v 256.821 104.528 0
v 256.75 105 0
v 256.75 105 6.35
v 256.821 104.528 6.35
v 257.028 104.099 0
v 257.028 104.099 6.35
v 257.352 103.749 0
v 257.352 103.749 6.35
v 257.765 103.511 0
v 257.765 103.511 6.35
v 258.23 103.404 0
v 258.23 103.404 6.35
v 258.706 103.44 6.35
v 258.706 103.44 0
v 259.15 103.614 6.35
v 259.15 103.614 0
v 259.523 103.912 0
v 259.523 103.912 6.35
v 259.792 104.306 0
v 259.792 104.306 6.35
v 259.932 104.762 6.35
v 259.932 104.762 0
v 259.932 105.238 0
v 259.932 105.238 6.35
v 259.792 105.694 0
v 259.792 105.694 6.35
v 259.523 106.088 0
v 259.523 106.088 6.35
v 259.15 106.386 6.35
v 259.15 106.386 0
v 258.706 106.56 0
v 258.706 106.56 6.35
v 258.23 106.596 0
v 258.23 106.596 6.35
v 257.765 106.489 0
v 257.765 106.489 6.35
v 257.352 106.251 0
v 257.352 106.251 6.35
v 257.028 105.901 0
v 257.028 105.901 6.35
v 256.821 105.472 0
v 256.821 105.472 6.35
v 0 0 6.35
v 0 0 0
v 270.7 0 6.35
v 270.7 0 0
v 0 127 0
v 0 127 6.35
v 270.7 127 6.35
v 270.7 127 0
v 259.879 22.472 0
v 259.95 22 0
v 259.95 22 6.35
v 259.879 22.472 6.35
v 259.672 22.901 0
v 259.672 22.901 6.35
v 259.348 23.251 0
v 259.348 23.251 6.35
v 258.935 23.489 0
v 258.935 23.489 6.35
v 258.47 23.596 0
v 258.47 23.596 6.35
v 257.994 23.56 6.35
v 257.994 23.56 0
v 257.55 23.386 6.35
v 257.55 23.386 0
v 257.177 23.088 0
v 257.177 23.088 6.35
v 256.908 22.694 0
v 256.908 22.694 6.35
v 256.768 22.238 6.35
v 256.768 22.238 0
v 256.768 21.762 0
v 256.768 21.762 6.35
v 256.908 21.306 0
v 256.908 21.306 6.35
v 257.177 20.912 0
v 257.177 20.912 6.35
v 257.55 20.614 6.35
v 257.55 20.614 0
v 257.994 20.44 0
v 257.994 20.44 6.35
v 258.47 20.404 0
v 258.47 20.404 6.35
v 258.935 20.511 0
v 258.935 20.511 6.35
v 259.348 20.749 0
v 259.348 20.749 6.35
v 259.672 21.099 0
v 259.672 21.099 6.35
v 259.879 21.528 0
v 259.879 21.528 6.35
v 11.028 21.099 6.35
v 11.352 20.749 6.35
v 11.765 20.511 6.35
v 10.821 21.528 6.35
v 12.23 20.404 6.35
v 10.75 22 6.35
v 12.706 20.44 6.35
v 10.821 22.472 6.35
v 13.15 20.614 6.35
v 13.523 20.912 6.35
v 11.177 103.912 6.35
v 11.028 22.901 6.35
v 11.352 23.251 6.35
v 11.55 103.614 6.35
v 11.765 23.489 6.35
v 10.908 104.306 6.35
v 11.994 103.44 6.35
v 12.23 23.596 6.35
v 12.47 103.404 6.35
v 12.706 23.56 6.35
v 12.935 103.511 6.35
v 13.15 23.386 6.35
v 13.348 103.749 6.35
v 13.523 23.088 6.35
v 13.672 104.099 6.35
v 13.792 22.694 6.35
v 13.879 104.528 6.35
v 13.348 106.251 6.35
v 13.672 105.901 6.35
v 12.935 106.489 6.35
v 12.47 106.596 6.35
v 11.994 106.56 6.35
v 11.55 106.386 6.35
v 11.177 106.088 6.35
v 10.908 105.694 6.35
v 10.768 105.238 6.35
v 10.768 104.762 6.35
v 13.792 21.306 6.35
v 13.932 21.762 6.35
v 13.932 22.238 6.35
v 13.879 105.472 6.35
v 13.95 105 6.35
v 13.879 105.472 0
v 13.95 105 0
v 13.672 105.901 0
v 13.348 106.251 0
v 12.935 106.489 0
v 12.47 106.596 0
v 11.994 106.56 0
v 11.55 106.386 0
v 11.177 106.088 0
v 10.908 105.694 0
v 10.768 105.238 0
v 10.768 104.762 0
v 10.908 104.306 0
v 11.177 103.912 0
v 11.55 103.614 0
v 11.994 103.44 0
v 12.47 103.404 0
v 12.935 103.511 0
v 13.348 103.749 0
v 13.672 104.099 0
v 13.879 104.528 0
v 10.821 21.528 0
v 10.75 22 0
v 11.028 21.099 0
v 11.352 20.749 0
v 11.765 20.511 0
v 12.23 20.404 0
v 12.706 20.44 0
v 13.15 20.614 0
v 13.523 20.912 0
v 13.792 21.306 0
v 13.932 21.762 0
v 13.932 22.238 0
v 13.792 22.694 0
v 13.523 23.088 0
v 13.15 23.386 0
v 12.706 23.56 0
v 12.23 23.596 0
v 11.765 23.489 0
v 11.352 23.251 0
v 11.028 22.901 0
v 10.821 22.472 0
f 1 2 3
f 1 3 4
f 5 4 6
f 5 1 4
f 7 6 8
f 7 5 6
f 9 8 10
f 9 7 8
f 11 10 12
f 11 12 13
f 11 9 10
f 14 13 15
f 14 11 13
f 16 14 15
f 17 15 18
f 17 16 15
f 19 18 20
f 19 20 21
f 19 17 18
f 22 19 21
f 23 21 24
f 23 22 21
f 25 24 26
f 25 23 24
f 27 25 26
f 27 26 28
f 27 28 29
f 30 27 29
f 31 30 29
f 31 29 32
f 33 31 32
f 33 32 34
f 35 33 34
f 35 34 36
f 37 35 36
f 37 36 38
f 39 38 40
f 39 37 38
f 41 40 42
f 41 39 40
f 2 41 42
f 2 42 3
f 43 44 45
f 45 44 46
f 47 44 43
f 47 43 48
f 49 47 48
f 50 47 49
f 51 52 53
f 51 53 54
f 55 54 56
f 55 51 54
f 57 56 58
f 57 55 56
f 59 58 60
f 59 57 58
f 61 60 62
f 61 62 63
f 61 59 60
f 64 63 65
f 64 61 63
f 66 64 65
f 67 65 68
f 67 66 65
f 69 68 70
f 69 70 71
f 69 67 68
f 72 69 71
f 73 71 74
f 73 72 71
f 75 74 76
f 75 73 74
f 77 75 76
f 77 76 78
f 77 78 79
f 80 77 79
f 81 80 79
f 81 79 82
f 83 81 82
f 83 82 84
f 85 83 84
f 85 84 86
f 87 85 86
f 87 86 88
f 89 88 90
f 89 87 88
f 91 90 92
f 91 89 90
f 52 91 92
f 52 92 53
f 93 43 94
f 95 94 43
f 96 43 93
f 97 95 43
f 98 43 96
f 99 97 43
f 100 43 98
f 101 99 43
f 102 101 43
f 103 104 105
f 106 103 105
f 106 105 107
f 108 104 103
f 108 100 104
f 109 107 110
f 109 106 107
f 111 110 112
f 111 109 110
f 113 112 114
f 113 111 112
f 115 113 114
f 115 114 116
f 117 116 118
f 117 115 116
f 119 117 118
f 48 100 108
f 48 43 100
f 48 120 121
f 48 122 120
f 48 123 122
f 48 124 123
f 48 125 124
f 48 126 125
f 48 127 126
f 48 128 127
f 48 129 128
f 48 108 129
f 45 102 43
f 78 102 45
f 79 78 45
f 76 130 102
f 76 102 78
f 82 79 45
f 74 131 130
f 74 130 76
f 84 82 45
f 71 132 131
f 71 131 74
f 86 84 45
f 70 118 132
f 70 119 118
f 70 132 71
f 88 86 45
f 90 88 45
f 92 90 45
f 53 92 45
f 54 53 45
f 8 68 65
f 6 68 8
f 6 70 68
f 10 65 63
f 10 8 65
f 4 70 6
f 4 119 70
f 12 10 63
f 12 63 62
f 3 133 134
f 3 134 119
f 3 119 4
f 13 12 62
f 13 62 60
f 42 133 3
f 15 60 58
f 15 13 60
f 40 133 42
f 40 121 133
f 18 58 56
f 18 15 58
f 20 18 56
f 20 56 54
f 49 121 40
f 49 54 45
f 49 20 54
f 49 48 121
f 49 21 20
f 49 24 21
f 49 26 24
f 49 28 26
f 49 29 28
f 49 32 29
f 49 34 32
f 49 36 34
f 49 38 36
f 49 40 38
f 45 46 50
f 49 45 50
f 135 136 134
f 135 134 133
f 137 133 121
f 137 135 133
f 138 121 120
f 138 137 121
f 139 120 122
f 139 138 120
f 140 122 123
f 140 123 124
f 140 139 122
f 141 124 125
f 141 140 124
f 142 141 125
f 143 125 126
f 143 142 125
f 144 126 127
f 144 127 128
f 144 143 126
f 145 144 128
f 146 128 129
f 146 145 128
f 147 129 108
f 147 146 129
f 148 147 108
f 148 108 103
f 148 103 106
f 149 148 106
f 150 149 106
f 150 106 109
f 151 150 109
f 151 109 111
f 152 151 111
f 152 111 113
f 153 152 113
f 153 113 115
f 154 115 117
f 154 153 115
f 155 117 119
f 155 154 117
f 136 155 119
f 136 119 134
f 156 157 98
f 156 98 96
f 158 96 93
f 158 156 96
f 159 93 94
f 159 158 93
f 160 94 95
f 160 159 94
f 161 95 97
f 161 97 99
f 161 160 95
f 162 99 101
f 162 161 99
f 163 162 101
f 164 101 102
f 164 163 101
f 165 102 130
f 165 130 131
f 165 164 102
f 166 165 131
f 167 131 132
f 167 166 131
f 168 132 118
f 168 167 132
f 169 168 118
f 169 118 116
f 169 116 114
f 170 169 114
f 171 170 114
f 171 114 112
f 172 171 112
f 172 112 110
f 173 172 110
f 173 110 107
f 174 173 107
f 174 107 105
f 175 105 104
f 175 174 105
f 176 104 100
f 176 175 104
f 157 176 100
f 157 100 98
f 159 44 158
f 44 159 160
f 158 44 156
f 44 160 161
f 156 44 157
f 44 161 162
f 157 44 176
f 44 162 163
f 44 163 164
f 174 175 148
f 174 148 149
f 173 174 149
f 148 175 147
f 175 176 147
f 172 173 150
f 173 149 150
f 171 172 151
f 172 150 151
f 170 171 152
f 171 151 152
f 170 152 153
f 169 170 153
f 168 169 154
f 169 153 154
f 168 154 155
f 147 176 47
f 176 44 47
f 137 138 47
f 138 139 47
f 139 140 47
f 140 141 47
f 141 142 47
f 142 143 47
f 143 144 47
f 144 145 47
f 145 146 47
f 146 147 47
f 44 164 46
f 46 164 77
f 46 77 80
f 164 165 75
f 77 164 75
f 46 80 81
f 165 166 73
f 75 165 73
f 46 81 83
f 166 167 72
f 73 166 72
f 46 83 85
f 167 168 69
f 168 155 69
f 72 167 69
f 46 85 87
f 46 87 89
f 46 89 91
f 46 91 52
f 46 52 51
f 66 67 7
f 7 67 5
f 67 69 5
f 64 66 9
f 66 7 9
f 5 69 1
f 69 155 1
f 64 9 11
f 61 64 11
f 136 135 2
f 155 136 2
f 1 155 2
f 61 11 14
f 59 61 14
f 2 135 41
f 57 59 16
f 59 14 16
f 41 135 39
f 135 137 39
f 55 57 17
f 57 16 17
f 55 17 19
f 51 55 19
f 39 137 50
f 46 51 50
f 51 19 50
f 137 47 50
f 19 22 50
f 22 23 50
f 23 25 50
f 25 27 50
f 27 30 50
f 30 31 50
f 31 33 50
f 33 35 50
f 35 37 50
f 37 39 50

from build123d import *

# Parameters (mm, degrees)
SKETCH1_W  = 270.7
SKETCH1_H  = 127
SKETCH1_R  = 1.6
WALL_DEPTH = 6.35


with BuildPart() as part:
    # Sketch1 → Wall (new body)
    with BuildSketch(Plane.XY):
        with Locations((135.35, 63.5)):
            Rectangle(SKETCH1_W, SKETCH1_H)
        with Locations((12.35, 105)):
            Circle(SKETCH1_R, mode=Mode.SUBTRACT)
        with Locations(Location((258.35, 105, 0), (0, 0, 180))):
            Circle(SKETCH1_R, mode=Mode.SUBTRACT)
        with Locations((258.35, 22)):
            Circle(SKETCH1_R, mode=Mode.SUBTRACT)
        with Locations(Location((12.35, 22, 0), (0, 0, 180))):
            Circle(SKETCH1_R, mode=Mode.SUBTRACT)
    extrude(amount=WALL_DEPTH)


solid = part.part
